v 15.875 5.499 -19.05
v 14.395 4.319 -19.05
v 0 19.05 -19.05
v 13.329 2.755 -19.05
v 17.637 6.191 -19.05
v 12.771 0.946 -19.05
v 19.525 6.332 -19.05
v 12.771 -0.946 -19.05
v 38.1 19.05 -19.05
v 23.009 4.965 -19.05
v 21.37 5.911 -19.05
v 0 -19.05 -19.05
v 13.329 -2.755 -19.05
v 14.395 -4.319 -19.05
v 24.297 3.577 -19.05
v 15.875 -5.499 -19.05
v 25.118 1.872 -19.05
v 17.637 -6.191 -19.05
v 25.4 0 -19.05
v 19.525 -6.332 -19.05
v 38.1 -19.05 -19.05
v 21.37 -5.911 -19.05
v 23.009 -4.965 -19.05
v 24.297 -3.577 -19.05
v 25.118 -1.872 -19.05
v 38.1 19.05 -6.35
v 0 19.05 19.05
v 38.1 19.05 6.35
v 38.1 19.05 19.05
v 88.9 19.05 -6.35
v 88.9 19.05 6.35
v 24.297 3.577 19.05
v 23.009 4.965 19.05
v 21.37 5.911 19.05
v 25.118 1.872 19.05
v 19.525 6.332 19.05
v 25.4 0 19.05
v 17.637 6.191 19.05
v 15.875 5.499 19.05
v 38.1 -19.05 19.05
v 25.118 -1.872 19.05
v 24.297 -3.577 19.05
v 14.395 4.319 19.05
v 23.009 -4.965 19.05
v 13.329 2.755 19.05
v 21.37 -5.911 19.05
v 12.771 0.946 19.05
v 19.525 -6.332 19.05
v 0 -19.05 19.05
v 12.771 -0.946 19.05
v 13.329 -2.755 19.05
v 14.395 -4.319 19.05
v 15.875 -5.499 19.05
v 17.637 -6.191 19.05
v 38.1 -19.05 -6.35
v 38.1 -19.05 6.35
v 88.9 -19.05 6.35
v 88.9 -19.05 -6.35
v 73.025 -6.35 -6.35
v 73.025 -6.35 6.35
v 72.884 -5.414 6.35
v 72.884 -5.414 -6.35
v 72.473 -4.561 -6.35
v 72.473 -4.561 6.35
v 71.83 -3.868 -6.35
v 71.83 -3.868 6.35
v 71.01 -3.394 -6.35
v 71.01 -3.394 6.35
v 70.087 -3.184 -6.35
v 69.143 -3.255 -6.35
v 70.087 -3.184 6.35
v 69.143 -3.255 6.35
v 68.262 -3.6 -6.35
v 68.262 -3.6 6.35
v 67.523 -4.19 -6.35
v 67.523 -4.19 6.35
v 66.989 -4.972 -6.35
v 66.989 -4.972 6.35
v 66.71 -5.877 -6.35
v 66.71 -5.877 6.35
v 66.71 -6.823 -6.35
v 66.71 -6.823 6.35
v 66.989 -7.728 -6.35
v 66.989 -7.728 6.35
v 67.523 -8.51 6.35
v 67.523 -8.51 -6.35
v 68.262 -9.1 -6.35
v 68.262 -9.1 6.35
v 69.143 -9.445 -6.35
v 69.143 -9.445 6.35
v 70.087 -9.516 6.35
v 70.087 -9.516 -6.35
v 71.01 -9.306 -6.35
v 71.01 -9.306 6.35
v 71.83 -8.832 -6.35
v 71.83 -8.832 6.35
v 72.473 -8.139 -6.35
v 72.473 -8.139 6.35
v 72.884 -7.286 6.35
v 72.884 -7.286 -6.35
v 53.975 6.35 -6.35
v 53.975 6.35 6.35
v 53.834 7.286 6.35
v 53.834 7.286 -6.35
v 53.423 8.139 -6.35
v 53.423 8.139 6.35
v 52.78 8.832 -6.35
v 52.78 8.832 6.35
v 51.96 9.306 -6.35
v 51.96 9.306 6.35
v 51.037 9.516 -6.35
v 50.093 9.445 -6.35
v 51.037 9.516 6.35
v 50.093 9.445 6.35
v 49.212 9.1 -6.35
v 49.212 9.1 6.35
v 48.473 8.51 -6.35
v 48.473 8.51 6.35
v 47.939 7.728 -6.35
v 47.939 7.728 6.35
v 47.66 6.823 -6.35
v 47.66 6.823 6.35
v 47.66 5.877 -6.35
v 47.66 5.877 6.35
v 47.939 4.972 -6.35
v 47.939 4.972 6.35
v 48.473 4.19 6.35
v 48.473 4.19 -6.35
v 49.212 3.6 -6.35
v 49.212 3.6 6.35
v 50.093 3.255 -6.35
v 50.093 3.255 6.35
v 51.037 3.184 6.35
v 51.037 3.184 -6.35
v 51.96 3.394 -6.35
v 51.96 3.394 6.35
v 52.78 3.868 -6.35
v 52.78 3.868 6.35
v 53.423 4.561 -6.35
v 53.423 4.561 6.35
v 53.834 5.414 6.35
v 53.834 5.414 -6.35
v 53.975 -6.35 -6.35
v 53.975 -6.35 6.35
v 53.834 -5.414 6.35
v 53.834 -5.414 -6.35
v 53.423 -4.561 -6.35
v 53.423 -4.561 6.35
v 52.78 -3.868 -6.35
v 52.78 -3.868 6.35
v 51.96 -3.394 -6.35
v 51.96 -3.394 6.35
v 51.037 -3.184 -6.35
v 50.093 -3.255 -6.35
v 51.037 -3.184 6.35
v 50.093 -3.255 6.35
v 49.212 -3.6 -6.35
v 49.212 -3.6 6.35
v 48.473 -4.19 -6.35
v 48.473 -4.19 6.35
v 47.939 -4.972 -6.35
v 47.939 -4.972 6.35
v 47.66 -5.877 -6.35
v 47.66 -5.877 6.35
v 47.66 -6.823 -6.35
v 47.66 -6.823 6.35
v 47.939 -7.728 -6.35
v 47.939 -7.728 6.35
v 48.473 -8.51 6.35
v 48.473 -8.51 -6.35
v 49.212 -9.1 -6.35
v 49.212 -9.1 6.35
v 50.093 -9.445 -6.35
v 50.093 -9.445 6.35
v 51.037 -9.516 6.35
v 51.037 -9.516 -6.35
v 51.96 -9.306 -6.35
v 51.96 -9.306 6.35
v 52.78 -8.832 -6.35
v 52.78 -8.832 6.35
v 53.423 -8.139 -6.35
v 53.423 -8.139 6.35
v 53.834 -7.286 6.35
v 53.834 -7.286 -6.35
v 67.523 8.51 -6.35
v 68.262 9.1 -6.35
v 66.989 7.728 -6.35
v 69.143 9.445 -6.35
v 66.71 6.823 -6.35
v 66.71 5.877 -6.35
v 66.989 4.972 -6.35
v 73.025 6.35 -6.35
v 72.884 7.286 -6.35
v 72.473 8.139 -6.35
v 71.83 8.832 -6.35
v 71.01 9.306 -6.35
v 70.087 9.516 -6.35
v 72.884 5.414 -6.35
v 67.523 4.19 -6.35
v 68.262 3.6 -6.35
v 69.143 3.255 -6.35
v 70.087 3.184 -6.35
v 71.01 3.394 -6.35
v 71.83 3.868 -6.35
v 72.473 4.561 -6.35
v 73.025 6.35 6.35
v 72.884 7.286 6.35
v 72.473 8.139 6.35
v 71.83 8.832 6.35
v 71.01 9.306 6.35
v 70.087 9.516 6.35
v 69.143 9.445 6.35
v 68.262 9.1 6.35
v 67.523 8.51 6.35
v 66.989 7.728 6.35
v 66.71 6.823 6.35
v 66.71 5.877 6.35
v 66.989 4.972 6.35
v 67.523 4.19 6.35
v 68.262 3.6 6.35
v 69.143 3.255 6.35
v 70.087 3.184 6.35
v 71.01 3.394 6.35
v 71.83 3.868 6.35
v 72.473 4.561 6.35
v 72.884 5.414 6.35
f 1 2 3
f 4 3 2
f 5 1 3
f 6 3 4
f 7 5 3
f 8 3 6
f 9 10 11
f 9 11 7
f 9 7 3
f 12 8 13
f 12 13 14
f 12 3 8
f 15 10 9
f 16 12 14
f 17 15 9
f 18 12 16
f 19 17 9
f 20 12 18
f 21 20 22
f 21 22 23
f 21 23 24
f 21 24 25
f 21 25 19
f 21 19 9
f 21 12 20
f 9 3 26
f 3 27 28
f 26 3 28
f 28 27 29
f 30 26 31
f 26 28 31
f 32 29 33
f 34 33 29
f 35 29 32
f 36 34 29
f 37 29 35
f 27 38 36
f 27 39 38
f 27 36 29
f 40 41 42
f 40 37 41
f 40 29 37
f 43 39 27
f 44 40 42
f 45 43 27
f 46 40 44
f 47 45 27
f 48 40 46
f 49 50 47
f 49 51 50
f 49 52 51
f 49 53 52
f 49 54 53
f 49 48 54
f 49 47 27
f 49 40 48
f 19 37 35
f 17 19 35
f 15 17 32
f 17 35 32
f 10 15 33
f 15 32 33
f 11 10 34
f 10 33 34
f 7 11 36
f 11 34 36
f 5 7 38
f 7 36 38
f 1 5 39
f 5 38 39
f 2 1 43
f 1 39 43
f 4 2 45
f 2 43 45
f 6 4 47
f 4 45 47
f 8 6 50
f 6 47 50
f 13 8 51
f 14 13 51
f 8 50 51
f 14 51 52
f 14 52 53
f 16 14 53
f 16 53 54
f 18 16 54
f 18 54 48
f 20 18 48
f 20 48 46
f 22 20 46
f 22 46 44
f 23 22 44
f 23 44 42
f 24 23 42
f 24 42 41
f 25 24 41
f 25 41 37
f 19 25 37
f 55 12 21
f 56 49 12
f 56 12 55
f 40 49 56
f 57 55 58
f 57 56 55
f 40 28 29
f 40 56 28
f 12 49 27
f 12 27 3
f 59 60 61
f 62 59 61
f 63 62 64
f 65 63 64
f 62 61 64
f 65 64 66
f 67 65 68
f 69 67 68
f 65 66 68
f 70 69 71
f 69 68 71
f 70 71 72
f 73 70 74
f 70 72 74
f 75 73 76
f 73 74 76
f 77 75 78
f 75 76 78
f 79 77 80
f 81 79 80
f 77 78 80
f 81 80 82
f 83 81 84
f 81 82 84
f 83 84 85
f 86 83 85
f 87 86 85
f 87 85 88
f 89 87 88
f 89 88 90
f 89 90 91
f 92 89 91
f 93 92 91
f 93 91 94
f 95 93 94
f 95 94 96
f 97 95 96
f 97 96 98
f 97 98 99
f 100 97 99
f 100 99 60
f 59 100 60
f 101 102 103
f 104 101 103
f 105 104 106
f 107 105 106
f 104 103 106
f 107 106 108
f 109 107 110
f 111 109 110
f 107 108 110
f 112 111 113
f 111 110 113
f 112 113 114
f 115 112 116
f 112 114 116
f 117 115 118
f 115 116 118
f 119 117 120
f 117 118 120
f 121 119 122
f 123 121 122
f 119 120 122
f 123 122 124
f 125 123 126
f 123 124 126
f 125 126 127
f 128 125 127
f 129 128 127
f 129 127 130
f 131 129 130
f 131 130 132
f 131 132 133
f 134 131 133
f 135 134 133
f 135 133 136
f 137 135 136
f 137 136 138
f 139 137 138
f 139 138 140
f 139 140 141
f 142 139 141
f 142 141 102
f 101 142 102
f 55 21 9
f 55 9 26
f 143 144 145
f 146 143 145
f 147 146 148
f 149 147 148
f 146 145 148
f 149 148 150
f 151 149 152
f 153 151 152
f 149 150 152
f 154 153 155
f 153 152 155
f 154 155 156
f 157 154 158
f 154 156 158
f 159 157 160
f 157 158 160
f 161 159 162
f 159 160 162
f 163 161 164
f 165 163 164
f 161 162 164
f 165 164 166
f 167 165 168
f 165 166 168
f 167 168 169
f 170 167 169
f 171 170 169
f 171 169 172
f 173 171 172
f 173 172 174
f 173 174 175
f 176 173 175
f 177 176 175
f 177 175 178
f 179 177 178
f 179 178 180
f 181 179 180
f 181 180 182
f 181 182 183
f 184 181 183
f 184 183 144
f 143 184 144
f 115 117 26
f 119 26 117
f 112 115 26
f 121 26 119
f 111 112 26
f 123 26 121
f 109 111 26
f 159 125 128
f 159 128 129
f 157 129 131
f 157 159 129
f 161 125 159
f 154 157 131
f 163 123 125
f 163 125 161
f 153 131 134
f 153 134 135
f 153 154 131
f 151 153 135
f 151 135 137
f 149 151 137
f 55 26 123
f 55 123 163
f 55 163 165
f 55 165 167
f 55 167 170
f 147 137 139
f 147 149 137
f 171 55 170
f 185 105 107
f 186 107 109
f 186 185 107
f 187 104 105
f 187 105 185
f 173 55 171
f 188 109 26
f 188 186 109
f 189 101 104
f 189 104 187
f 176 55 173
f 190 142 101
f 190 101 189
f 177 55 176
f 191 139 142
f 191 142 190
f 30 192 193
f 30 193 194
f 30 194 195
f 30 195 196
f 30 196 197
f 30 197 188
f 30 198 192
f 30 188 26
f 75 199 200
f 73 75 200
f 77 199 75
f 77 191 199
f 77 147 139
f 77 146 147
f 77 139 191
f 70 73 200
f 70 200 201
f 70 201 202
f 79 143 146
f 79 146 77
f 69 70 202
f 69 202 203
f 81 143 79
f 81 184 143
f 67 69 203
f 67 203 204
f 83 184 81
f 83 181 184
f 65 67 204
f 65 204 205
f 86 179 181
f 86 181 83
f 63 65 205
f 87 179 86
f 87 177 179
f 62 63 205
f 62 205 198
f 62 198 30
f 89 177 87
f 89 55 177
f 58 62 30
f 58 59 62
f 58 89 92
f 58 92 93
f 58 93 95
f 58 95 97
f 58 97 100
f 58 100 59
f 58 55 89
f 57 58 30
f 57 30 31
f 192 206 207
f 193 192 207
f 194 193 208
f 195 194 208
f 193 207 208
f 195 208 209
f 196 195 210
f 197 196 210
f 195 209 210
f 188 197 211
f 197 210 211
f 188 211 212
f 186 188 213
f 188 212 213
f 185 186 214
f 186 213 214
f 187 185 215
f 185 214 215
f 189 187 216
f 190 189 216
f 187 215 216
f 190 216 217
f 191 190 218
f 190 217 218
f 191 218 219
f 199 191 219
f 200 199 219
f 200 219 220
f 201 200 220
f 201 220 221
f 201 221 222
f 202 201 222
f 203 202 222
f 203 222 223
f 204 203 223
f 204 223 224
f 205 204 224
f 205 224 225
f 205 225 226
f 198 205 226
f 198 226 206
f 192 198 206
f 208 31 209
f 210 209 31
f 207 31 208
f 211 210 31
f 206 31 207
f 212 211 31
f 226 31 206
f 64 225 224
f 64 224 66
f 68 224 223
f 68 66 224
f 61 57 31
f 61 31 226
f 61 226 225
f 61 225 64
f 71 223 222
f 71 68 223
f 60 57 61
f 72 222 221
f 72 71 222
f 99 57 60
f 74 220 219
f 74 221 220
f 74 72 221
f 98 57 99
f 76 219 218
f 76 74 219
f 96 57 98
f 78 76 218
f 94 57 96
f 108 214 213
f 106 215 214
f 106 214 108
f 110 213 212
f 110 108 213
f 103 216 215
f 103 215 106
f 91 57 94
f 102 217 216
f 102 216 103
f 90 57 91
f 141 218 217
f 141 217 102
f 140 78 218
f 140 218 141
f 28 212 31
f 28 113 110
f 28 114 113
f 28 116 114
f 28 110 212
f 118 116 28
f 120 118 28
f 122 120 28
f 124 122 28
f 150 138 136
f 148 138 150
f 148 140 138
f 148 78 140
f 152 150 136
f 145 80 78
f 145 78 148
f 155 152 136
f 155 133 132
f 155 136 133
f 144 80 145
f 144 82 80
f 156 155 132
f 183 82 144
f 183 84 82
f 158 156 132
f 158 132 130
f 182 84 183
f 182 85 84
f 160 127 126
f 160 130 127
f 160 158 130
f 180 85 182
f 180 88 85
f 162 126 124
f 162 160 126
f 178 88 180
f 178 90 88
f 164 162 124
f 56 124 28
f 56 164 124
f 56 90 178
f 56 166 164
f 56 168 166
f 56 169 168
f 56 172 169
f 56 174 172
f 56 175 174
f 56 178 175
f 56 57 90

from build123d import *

# Parameters (mm, degrees)
F1_DEPTH = 19.05
F2_R     = 6.35
F2_R_2   = 3.175
F3_DEPTH = 38.101


with BuildPart() as f1:
    # F0 (on Front) → F1 (new body, symmetric)
    with BuildSketch(Plane.XZ):
        Polygon((38.1, 19.05), (0, 19.05), (0, -19.05), (38.1, -19.05), (38.1, -6.35), (88.9, -6.35), (88.9, 6.35), (38.1, 6.35), align=None)
    extrude(amount=F1_DEPTH, both=True)

    # F2 (on face) → F3 (cut, through all)
    with BuildSketch(Plane.XY.offset(19.05)):
        with Locations((19.05, 0)):
            Circle(F2_R)
        with Locations((50.8, 6.35)):
            Circle(F2_R_2)
        with Locations((50.8, -6.35)):
            Circle(F2_R_2)
        with Locations((69.85, -6.35)):
            Circle(F2_R_2)
        with Locations((69.85, 6.35)):
            Circle(F2_R_2)
    extrude(amount=-F3_DEPTH, mode=Mode.SUBTRACT)


solid = f1.part
